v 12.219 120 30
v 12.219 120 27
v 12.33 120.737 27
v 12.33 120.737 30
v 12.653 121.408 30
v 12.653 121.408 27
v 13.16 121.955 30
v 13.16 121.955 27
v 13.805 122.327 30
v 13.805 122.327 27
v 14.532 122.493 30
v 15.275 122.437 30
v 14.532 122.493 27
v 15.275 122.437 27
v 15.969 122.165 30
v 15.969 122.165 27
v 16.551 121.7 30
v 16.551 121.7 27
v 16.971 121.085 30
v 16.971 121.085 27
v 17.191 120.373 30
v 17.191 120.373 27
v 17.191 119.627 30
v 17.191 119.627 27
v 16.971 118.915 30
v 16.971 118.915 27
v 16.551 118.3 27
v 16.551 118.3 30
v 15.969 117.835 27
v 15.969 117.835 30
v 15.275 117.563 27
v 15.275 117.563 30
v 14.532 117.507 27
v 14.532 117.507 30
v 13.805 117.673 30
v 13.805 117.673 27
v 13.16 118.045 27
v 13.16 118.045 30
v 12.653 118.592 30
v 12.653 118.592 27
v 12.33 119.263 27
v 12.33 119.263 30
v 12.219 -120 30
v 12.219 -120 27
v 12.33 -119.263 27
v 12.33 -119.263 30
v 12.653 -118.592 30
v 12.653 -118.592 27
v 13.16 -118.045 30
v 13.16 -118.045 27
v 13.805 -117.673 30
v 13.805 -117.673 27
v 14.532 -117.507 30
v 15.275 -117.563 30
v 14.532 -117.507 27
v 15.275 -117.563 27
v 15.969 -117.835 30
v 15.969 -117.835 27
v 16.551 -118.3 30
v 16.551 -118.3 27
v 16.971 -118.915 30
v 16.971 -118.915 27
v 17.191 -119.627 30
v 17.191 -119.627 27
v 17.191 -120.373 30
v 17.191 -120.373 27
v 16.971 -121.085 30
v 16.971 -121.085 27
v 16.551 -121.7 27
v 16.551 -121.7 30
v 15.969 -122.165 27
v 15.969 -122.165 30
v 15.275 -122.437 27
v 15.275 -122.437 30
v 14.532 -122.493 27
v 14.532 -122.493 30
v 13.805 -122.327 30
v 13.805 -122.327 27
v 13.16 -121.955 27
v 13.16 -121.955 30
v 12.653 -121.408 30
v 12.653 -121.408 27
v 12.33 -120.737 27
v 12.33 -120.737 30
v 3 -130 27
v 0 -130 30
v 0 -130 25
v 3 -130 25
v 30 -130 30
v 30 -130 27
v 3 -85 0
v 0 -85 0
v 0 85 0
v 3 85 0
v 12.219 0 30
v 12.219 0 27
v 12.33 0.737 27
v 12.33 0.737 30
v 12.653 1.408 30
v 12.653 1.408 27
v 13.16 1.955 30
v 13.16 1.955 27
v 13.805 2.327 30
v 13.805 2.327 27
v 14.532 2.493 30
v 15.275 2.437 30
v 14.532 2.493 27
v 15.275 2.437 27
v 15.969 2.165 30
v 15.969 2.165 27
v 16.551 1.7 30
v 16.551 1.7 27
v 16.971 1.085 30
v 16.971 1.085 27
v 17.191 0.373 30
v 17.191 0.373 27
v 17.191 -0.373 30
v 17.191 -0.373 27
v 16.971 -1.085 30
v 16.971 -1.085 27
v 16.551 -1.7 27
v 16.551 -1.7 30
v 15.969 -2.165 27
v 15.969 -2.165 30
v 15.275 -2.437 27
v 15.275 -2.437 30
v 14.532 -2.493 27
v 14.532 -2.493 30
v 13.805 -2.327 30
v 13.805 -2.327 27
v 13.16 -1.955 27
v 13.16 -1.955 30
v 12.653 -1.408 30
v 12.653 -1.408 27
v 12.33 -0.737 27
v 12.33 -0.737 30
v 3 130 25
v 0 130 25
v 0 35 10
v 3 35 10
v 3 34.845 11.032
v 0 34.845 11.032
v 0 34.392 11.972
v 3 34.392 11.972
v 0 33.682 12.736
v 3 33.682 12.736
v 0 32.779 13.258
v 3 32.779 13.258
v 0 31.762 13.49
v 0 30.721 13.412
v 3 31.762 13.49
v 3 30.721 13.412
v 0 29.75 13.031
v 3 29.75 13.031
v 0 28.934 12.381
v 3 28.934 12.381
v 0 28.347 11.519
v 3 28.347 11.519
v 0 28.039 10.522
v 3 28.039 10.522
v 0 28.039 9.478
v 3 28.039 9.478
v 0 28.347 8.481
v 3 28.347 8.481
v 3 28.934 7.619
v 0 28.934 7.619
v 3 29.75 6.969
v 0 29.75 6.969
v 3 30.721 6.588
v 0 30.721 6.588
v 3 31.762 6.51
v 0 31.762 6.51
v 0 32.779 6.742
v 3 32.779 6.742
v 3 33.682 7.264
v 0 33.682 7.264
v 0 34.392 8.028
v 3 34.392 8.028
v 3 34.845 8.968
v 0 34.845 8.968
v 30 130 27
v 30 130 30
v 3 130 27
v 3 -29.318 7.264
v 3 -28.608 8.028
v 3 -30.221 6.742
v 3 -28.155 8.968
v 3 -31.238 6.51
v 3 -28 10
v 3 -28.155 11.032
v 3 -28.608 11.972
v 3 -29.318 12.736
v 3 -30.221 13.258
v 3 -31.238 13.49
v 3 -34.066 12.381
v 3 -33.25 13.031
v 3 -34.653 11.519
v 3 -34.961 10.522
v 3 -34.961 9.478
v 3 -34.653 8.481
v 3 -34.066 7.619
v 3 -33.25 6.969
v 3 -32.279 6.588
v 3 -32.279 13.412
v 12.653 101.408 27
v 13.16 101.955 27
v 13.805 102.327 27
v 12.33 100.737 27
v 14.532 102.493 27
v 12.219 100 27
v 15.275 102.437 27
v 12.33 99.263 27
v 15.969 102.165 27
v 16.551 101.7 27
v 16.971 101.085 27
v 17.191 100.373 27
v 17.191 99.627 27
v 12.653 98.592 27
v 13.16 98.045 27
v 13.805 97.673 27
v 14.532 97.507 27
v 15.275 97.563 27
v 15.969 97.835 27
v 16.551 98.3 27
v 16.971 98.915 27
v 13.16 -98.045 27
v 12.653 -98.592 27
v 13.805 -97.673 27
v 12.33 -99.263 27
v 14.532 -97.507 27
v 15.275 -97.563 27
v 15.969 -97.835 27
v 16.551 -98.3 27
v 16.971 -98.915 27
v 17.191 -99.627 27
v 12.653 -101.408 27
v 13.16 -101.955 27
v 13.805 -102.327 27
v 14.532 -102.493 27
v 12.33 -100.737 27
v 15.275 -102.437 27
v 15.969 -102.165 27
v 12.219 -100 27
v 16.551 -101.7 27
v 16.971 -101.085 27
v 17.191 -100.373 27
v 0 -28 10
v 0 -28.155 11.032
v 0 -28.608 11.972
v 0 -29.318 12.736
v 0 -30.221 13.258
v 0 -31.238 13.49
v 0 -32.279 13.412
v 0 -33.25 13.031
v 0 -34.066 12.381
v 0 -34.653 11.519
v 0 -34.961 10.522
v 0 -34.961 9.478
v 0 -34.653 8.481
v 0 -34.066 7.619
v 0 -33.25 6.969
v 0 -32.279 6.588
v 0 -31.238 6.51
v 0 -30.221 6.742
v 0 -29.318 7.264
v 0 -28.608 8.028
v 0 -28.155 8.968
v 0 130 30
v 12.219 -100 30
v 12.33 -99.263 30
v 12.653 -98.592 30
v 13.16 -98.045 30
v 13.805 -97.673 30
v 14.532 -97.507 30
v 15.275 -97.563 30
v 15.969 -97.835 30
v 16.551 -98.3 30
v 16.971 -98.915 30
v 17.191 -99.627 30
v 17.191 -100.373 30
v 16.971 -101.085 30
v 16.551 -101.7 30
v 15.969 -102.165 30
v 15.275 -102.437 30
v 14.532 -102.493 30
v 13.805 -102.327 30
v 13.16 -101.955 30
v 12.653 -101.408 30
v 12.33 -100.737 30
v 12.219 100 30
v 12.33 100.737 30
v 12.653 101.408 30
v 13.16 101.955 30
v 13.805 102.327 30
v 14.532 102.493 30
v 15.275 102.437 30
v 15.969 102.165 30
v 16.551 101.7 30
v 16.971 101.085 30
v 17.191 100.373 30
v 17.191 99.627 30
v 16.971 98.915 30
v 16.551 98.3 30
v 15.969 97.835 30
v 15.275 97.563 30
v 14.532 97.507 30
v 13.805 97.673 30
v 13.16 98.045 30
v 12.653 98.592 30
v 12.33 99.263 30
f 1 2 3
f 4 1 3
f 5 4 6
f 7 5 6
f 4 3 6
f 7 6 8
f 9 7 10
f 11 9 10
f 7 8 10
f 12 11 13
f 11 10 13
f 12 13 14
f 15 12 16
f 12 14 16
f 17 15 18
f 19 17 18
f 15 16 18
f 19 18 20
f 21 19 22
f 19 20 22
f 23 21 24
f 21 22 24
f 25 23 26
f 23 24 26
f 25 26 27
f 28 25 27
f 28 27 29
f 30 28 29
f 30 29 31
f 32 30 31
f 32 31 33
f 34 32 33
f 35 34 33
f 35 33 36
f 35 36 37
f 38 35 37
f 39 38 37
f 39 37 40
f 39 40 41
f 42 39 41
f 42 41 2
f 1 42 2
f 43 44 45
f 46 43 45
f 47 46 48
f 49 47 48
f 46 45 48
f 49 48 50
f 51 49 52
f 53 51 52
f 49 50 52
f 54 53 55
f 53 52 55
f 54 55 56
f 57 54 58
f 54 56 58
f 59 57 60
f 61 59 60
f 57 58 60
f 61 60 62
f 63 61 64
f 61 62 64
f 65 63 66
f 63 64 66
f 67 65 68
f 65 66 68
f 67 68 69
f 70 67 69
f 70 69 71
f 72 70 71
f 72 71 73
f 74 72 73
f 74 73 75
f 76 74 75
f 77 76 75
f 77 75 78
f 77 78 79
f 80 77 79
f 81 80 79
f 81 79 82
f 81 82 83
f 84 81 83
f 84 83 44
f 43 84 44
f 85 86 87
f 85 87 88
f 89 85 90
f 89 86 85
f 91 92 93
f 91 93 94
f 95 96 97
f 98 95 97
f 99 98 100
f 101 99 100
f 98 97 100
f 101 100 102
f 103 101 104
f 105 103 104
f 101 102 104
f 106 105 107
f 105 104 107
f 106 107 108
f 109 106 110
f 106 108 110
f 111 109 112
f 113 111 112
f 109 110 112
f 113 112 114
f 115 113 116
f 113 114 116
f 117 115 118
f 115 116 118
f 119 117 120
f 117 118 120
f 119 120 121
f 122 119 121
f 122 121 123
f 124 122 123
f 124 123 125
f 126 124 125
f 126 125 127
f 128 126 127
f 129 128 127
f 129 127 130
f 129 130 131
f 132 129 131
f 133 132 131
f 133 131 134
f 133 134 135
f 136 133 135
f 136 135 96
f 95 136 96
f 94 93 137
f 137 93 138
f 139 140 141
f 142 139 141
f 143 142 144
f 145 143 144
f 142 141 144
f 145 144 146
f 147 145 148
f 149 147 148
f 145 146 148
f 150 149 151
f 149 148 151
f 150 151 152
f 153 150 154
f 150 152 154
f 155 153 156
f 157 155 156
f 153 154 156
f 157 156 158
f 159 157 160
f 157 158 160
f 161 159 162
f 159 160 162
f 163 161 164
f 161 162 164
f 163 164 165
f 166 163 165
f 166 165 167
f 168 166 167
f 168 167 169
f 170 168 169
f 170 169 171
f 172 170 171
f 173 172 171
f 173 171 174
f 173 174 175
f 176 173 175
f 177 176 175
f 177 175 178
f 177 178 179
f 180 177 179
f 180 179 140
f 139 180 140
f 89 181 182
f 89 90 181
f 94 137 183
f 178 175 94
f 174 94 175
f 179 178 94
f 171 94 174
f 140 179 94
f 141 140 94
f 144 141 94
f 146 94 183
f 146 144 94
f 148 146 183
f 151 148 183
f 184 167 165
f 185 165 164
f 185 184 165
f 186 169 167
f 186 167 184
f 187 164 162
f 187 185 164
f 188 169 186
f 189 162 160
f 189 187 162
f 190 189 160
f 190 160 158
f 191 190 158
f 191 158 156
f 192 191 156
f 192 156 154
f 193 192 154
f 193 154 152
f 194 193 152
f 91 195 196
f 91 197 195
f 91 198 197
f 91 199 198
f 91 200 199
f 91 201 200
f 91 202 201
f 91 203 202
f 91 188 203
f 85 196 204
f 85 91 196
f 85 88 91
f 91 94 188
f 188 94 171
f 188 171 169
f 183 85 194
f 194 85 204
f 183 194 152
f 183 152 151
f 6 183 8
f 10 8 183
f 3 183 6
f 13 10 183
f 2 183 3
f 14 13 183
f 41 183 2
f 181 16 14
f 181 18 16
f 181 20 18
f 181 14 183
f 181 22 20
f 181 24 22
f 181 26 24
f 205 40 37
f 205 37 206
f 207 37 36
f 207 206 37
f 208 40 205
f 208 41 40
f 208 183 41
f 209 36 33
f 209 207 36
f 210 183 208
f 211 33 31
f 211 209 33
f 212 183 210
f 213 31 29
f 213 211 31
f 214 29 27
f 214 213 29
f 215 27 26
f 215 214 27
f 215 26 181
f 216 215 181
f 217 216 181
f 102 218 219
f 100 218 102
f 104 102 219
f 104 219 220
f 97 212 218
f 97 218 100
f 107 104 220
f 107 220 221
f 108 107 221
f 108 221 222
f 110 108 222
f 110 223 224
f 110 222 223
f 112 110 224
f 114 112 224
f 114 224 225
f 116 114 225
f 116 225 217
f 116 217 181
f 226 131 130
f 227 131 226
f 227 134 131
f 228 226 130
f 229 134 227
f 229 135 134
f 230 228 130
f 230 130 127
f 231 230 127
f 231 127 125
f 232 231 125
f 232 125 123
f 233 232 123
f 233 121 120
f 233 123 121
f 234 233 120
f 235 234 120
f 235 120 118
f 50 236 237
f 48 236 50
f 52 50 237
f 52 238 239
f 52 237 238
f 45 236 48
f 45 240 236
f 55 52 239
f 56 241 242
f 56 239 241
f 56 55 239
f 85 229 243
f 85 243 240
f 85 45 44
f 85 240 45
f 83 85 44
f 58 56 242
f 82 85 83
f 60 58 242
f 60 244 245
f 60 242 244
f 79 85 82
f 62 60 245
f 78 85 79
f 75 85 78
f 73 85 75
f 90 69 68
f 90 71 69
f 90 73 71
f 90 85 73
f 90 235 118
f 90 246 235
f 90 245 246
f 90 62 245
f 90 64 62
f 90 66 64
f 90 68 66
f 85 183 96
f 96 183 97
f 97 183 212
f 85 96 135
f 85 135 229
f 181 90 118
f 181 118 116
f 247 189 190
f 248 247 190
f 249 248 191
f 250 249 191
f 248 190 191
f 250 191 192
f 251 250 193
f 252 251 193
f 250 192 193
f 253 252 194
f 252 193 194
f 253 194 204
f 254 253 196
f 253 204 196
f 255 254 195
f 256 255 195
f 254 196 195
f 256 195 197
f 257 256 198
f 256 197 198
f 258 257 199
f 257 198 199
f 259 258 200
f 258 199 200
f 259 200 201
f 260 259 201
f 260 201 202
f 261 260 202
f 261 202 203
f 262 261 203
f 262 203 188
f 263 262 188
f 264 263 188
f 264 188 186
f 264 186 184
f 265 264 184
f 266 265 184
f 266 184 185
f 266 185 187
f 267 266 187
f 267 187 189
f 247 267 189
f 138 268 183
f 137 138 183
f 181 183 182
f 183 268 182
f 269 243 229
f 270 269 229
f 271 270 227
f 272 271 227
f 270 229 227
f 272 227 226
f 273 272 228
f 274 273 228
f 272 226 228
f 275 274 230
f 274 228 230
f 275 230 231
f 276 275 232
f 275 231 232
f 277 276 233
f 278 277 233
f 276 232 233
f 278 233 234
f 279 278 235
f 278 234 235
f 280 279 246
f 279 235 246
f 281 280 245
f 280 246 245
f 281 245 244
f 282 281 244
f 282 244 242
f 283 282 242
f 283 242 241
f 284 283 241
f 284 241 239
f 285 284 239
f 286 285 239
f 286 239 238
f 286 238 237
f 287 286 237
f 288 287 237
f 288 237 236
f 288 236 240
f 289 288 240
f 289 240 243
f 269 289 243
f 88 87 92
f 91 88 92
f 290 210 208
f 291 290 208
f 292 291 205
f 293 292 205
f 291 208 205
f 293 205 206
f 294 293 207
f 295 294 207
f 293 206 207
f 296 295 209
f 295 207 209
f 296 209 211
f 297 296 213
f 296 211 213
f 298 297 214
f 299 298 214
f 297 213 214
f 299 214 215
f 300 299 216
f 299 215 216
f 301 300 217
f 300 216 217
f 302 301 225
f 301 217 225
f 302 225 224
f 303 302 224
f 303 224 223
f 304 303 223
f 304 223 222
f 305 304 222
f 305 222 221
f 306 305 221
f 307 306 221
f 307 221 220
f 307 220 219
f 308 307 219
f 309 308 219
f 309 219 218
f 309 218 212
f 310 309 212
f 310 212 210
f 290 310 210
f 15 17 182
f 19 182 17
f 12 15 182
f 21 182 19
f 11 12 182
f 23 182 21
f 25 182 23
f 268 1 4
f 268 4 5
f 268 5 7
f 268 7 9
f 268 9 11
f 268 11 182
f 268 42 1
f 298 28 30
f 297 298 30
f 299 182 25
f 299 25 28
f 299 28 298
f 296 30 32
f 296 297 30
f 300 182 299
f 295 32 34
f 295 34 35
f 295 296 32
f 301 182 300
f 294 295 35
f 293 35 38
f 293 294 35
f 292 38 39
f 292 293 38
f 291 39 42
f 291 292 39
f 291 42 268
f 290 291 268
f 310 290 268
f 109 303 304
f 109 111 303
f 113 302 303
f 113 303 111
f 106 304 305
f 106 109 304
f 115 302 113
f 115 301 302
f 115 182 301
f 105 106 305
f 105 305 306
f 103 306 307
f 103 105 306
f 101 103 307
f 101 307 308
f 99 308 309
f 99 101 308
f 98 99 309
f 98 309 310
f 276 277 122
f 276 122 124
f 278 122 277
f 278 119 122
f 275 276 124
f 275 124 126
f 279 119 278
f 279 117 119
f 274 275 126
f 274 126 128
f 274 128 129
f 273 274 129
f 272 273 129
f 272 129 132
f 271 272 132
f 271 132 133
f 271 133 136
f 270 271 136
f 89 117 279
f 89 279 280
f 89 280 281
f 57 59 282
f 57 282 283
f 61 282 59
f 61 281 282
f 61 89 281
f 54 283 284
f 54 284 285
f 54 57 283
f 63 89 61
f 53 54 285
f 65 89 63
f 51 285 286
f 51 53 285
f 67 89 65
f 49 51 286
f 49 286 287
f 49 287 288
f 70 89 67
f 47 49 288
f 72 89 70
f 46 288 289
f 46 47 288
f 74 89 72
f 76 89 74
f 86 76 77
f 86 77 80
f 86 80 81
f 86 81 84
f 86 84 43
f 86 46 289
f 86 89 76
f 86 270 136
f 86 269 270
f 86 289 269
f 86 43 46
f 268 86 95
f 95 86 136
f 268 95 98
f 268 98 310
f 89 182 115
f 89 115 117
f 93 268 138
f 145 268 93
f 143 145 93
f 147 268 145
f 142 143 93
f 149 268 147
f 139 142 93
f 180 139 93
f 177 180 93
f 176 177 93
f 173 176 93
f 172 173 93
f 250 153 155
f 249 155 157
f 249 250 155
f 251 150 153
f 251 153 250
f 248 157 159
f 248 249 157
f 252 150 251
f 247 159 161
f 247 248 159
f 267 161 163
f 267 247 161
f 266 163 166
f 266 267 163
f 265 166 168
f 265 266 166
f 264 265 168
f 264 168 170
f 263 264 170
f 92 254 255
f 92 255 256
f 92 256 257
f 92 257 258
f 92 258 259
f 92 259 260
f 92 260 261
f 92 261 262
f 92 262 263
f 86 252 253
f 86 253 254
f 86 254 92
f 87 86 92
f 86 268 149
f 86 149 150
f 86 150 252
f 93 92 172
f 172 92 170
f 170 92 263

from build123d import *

# Parameters (mm, degrees)
F1_DEPTH = 130
F3_D     = 7
F5_D     = 5
F7_DEPTH = 25


# Not quite as in the source:
# - a feature names something its author has since deleted; it is built from what else it names


with BuildPart() as f1:
    # F0 (on Front) → F1 (new body, symmetric)
    with BuildSketch(Plane.XZ):
        Polygon((0, 30), (0, 0), (3, 0), (3, 27), (30, 27), (30, 30), align=None)
    extrude(amount=F1_DEPTH, both=True)

    # F3 (through all)
    with Locations(Plane(origin=(0, 0, 0), x_dir=(0, -1, 0), z_dir=(-1, 0, 0))):
        with Locations((-31.5, 10), (31.5, 10)):
            Hole(F3_D / 2)

    # F5 (through all)
    with Locations(Plane.XY.offset(30)):
        with Locations((14.7187495604, 0), (14.7187495604, -100), (14.7187495604, 100), (14.7187495604, -120), (14.7187495604, 120)):
            Hole(F5_D / 2)

    # F6 (on face) → F7 (cut)
    with BuildSketch(Plane(origin=(0, 0, 0), x_dir=(0, -1, 0), z_dir=(-1, 0, 0))):
        Polygon((-85, 0), (-130, 25), (-130, 0), align=None)
        Polygon((130, 0), (130, 25), (85, 0), align=None)
    extrude(amount=-F7_DEPTH, mode=Mode.SUBTRACT)


solid = f1.part
